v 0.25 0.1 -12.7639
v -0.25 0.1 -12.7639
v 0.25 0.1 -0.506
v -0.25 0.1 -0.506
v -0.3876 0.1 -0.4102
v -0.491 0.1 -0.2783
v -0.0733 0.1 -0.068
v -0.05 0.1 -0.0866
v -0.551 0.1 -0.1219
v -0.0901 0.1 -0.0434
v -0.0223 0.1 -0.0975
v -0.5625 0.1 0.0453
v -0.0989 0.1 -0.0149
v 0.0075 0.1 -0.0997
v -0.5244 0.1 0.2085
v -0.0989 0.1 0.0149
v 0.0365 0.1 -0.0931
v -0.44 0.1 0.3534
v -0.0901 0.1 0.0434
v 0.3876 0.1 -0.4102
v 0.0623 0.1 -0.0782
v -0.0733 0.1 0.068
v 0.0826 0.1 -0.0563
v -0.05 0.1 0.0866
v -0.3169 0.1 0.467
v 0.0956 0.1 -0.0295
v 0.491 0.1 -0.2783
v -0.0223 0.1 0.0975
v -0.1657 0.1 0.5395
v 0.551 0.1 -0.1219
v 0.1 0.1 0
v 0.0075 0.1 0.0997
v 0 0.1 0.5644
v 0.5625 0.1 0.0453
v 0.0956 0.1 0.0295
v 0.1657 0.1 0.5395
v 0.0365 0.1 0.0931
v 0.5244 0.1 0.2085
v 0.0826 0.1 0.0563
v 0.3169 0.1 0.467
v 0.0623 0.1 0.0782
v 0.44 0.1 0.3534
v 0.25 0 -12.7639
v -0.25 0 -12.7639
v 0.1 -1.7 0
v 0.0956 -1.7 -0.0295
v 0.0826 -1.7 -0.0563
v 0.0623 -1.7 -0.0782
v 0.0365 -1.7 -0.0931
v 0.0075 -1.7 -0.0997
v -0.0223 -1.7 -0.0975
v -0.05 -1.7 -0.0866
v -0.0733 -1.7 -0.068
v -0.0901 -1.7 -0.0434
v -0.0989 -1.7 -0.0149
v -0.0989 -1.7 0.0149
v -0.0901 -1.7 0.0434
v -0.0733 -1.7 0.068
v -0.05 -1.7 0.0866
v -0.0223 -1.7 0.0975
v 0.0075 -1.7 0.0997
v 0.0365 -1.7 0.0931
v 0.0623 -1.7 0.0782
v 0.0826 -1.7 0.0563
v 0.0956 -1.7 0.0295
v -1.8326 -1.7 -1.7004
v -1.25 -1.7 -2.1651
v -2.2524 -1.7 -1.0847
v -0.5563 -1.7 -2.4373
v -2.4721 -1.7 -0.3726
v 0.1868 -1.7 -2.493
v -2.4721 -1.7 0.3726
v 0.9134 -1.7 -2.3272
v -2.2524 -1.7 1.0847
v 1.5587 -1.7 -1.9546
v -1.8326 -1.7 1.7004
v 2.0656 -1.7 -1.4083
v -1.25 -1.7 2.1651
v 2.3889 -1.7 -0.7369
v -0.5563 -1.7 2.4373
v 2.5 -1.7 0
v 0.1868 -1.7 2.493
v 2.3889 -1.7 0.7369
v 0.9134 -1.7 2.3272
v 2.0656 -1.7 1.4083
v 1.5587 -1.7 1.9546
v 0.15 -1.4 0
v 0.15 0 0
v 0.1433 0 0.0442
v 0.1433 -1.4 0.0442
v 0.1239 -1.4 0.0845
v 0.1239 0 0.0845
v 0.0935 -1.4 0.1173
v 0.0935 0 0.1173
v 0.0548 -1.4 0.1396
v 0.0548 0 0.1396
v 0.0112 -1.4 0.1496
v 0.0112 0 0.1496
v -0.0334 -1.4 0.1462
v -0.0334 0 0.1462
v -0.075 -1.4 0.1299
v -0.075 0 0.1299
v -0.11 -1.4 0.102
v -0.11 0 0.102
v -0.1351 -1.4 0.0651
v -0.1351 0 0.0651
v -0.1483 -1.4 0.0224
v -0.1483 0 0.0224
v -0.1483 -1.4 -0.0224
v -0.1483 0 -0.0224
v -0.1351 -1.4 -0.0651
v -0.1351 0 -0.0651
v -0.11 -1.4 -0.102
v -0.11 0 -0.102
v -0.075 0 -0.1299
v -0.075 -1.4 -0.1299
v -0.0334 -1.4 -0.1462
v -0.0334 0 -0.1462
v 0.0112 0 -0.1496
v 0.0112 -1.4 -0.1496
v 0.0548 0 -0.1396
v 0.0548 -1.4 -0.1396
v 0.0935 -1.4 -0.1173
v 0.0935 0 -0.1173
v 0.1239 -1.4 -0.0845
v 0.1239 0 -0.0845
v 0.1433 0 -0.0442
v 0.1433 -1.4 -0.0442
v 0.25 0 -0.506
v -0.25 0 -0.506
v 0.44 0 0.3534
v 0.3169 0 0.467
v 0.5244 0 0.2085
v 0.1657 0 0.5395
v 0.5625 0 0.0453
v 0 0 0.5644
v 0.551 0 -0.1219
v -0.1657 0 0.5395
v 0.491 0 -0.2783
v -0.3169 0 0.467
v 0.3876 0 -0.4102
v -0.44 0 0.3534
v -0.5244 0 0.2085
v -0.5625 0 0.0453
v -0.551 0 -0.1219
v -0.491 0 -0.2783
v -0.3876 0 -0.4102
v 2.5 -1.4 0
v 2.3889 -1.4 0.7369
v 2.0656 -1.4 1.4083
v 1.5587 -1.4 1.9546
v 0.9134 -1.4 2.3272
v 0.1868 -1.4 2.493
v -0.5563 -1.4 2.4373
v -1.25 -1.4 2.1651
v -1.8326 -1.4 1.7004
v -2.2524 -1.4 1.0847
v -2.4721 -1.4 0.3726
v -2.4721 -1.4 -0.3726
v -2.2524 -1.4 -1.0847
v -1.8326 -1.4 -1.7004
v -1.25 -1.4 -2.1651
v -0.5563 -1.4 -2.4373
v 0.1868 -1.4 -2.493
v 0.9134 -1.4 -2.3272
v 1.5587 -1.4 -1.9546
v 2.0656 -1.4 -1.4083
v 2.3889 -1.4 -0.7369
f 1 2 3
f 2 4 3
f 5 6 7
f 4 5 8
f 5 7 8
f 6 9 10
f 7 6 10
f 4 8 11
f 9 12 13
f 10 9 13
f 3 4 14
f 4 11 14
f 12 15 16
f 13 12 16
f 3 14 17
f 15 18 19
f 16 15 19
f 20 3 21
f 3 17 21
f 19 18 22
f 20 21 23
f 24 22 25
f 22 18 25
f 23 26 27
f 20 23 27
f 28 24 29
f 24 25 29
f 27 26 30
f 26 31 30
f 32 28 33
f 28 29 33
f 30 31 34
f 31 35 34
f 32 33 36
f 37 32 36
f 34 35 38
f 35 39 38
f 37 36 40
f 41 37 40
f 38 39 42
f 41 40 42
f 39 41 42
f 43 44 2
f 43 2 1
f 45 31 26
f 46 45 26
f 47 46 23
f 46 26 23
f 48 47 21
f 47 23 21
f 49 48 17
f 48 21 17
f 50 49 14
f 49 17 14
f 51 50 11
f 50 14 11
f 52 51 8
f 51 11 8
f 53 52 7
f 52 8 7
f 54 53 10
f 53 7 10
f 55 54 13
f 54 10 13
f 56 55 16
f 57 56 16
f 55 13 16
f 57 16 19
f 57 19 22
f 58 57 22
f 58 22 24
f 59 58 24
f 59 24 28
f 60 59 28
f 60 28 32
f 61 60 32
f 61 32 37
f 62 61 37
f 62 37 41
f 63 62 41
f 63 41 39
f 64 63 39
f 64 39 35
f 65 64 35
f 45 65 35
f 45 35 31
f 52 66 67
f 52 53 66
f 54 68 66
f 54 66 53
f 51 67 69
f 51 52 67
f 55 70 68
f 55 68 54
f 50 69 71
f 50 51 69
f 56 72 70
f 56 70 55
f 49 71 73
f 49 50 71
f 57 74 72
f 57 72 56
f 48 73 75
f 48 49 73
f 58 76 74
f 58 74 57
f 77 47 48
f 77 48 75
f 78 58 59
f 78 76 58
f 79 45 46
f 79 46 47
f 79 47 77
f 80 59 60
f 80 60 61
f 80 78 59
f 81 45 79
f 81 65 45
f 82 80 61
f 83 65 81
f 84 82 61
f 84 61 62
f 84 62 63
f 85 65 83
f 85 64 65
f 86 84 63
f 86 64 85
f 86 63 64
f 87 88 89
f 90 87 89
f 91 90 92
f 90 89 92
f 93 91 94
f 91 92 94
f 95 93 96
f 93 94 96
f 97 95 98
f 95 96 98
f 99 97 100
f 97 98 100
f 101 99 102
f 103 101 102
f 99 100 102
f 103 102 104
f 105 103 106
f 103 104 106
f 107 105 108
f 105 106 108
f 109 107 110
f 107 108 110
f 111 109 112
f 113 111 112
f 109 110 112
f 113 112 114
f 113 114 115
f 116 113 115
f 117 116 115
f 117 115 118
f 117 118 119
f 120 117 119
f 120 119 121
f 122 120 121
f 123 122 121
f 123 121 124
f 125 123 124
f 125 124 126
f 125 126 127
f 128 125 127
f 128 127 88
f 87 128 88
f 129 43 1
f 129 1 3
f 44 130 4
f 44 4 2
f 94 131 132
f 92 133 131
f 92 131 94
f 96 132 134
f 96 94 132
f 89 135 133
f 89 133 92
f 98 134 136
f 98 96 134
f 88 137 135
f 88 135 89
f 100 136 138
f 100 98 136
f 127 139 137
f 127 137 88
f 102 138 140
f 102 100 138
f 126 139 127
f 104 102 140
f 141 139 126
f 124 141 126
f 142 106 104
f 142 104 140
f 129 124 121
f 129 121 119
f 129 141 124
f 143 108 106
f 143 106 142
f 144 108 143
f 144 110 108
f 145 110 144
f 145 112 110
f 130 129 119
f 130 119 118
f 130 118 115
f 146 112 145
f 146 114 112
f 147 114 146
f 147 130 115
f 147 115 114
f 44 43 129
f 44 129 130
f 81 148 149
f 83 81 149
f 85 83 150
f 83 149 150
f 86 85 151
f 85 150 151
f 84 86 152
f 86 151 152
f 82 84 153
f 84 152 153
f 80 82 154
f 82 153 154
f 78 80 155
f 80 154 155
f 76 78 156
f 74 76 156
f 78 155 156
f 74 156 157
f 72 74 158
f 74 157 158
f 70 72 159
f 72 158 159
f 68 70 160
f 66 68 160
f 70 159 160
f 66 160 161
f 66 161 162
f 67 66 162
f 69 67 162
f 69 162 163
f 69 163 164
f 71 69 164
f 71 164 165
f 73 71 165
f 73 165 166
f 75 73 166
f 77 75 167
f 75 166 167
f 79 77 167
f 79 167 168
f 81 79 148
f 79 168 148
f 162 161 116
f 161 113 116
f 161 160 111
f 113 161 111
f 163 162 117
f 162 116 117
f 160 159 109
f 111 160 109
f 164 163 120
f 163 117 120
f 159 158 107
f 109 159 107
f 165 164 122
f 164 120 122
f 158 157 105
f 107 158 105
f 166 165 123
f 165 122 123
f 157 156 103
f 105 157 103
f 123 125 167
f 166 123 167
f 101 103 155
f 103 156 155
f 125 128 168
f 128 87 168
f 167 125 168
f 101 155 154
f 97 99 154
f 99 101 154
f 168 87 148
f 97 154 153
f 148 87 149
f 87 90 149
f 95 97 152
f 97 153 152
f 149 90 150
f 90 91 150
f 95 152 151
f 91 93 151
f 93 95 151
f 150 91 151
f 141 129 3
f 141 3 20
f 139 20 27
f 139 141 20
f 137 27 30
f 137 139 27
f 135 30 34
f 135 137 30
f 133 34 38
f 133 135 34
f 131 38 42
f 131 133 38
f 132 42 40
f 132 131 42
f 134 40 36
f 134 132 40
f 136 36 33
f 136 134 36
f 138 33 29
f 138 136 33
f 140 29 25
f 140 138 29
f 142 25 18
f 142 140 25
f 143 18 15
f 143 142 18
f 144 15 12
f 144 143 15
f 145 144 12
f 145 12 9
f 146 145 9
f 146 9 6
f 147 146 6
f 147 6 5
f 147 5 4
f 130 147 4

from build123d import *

# Parameters (mm, degrees)
BOSS_EXTRUDE1_DEPTH = 0.1
SKETCH2_R           = 0.15
BOSS_EXTRUDE2_DEPTH = 1.5
SKETCH3_R           = 2.5
BOSS_EXTRUDE3_DEPTH = 0.3
SKETCH4_R           = 0.1
CUT_EXTRUDE1_DEPTH  = 2.8


with BuildPart() as part:
    # Sketch1 → Boss-Extrude1 (new body)
    with BuildSketch(Plane(origin=(0, 0, 0), x_dir=(1, 0, 0), z_dir=(0, 1, 0))):
        with BuildLine():
            Line((-0.25, 12.763947624), (0.25, 12.763947624))
            Line((0.25, 12.763947624), (0.25, 0.505972083))
            ThreePointArc((0.25, 0.505972083), (0, -0.564364907), (-0.25, 0.505972083))
            Line((-0.25, 0.505972083), (-0.25, 12.763947624))
        make_face()
    extrude(amount=BOSS_EXTRUDE1_DEPTH)

    # Sketch2 → Boss-Extrude2 (add)
    with BuildSketch(Plane.XZ.offset(-0.1)):
        Circle(SKETCH2_R)
    extrude(amount=BOSS_EXTRUDE2_DEPTH)

    # Sketch3 → Boss-Extrude3 (add)
    with BuildSketch(Plane.XZ.offset(1.4)):
        Circle(SKETCH3_R)
    extrude(amount=BOSS_EXTRUDE3_DEPTH)

    # Sketch4 → Cut-Extrude1 (cut, through all)
    with BuildSketch(Plane(origin=(0, 0.1, 0), x_dir=(1, 0, 0), z_dir=(0, 1, 0))):
        Circle(SKETCH4_R)
    extrude(amount=-CUT_EXTRUDE1_DEPTH, mode=Mode.SUBTRACT)


solid = part.part
